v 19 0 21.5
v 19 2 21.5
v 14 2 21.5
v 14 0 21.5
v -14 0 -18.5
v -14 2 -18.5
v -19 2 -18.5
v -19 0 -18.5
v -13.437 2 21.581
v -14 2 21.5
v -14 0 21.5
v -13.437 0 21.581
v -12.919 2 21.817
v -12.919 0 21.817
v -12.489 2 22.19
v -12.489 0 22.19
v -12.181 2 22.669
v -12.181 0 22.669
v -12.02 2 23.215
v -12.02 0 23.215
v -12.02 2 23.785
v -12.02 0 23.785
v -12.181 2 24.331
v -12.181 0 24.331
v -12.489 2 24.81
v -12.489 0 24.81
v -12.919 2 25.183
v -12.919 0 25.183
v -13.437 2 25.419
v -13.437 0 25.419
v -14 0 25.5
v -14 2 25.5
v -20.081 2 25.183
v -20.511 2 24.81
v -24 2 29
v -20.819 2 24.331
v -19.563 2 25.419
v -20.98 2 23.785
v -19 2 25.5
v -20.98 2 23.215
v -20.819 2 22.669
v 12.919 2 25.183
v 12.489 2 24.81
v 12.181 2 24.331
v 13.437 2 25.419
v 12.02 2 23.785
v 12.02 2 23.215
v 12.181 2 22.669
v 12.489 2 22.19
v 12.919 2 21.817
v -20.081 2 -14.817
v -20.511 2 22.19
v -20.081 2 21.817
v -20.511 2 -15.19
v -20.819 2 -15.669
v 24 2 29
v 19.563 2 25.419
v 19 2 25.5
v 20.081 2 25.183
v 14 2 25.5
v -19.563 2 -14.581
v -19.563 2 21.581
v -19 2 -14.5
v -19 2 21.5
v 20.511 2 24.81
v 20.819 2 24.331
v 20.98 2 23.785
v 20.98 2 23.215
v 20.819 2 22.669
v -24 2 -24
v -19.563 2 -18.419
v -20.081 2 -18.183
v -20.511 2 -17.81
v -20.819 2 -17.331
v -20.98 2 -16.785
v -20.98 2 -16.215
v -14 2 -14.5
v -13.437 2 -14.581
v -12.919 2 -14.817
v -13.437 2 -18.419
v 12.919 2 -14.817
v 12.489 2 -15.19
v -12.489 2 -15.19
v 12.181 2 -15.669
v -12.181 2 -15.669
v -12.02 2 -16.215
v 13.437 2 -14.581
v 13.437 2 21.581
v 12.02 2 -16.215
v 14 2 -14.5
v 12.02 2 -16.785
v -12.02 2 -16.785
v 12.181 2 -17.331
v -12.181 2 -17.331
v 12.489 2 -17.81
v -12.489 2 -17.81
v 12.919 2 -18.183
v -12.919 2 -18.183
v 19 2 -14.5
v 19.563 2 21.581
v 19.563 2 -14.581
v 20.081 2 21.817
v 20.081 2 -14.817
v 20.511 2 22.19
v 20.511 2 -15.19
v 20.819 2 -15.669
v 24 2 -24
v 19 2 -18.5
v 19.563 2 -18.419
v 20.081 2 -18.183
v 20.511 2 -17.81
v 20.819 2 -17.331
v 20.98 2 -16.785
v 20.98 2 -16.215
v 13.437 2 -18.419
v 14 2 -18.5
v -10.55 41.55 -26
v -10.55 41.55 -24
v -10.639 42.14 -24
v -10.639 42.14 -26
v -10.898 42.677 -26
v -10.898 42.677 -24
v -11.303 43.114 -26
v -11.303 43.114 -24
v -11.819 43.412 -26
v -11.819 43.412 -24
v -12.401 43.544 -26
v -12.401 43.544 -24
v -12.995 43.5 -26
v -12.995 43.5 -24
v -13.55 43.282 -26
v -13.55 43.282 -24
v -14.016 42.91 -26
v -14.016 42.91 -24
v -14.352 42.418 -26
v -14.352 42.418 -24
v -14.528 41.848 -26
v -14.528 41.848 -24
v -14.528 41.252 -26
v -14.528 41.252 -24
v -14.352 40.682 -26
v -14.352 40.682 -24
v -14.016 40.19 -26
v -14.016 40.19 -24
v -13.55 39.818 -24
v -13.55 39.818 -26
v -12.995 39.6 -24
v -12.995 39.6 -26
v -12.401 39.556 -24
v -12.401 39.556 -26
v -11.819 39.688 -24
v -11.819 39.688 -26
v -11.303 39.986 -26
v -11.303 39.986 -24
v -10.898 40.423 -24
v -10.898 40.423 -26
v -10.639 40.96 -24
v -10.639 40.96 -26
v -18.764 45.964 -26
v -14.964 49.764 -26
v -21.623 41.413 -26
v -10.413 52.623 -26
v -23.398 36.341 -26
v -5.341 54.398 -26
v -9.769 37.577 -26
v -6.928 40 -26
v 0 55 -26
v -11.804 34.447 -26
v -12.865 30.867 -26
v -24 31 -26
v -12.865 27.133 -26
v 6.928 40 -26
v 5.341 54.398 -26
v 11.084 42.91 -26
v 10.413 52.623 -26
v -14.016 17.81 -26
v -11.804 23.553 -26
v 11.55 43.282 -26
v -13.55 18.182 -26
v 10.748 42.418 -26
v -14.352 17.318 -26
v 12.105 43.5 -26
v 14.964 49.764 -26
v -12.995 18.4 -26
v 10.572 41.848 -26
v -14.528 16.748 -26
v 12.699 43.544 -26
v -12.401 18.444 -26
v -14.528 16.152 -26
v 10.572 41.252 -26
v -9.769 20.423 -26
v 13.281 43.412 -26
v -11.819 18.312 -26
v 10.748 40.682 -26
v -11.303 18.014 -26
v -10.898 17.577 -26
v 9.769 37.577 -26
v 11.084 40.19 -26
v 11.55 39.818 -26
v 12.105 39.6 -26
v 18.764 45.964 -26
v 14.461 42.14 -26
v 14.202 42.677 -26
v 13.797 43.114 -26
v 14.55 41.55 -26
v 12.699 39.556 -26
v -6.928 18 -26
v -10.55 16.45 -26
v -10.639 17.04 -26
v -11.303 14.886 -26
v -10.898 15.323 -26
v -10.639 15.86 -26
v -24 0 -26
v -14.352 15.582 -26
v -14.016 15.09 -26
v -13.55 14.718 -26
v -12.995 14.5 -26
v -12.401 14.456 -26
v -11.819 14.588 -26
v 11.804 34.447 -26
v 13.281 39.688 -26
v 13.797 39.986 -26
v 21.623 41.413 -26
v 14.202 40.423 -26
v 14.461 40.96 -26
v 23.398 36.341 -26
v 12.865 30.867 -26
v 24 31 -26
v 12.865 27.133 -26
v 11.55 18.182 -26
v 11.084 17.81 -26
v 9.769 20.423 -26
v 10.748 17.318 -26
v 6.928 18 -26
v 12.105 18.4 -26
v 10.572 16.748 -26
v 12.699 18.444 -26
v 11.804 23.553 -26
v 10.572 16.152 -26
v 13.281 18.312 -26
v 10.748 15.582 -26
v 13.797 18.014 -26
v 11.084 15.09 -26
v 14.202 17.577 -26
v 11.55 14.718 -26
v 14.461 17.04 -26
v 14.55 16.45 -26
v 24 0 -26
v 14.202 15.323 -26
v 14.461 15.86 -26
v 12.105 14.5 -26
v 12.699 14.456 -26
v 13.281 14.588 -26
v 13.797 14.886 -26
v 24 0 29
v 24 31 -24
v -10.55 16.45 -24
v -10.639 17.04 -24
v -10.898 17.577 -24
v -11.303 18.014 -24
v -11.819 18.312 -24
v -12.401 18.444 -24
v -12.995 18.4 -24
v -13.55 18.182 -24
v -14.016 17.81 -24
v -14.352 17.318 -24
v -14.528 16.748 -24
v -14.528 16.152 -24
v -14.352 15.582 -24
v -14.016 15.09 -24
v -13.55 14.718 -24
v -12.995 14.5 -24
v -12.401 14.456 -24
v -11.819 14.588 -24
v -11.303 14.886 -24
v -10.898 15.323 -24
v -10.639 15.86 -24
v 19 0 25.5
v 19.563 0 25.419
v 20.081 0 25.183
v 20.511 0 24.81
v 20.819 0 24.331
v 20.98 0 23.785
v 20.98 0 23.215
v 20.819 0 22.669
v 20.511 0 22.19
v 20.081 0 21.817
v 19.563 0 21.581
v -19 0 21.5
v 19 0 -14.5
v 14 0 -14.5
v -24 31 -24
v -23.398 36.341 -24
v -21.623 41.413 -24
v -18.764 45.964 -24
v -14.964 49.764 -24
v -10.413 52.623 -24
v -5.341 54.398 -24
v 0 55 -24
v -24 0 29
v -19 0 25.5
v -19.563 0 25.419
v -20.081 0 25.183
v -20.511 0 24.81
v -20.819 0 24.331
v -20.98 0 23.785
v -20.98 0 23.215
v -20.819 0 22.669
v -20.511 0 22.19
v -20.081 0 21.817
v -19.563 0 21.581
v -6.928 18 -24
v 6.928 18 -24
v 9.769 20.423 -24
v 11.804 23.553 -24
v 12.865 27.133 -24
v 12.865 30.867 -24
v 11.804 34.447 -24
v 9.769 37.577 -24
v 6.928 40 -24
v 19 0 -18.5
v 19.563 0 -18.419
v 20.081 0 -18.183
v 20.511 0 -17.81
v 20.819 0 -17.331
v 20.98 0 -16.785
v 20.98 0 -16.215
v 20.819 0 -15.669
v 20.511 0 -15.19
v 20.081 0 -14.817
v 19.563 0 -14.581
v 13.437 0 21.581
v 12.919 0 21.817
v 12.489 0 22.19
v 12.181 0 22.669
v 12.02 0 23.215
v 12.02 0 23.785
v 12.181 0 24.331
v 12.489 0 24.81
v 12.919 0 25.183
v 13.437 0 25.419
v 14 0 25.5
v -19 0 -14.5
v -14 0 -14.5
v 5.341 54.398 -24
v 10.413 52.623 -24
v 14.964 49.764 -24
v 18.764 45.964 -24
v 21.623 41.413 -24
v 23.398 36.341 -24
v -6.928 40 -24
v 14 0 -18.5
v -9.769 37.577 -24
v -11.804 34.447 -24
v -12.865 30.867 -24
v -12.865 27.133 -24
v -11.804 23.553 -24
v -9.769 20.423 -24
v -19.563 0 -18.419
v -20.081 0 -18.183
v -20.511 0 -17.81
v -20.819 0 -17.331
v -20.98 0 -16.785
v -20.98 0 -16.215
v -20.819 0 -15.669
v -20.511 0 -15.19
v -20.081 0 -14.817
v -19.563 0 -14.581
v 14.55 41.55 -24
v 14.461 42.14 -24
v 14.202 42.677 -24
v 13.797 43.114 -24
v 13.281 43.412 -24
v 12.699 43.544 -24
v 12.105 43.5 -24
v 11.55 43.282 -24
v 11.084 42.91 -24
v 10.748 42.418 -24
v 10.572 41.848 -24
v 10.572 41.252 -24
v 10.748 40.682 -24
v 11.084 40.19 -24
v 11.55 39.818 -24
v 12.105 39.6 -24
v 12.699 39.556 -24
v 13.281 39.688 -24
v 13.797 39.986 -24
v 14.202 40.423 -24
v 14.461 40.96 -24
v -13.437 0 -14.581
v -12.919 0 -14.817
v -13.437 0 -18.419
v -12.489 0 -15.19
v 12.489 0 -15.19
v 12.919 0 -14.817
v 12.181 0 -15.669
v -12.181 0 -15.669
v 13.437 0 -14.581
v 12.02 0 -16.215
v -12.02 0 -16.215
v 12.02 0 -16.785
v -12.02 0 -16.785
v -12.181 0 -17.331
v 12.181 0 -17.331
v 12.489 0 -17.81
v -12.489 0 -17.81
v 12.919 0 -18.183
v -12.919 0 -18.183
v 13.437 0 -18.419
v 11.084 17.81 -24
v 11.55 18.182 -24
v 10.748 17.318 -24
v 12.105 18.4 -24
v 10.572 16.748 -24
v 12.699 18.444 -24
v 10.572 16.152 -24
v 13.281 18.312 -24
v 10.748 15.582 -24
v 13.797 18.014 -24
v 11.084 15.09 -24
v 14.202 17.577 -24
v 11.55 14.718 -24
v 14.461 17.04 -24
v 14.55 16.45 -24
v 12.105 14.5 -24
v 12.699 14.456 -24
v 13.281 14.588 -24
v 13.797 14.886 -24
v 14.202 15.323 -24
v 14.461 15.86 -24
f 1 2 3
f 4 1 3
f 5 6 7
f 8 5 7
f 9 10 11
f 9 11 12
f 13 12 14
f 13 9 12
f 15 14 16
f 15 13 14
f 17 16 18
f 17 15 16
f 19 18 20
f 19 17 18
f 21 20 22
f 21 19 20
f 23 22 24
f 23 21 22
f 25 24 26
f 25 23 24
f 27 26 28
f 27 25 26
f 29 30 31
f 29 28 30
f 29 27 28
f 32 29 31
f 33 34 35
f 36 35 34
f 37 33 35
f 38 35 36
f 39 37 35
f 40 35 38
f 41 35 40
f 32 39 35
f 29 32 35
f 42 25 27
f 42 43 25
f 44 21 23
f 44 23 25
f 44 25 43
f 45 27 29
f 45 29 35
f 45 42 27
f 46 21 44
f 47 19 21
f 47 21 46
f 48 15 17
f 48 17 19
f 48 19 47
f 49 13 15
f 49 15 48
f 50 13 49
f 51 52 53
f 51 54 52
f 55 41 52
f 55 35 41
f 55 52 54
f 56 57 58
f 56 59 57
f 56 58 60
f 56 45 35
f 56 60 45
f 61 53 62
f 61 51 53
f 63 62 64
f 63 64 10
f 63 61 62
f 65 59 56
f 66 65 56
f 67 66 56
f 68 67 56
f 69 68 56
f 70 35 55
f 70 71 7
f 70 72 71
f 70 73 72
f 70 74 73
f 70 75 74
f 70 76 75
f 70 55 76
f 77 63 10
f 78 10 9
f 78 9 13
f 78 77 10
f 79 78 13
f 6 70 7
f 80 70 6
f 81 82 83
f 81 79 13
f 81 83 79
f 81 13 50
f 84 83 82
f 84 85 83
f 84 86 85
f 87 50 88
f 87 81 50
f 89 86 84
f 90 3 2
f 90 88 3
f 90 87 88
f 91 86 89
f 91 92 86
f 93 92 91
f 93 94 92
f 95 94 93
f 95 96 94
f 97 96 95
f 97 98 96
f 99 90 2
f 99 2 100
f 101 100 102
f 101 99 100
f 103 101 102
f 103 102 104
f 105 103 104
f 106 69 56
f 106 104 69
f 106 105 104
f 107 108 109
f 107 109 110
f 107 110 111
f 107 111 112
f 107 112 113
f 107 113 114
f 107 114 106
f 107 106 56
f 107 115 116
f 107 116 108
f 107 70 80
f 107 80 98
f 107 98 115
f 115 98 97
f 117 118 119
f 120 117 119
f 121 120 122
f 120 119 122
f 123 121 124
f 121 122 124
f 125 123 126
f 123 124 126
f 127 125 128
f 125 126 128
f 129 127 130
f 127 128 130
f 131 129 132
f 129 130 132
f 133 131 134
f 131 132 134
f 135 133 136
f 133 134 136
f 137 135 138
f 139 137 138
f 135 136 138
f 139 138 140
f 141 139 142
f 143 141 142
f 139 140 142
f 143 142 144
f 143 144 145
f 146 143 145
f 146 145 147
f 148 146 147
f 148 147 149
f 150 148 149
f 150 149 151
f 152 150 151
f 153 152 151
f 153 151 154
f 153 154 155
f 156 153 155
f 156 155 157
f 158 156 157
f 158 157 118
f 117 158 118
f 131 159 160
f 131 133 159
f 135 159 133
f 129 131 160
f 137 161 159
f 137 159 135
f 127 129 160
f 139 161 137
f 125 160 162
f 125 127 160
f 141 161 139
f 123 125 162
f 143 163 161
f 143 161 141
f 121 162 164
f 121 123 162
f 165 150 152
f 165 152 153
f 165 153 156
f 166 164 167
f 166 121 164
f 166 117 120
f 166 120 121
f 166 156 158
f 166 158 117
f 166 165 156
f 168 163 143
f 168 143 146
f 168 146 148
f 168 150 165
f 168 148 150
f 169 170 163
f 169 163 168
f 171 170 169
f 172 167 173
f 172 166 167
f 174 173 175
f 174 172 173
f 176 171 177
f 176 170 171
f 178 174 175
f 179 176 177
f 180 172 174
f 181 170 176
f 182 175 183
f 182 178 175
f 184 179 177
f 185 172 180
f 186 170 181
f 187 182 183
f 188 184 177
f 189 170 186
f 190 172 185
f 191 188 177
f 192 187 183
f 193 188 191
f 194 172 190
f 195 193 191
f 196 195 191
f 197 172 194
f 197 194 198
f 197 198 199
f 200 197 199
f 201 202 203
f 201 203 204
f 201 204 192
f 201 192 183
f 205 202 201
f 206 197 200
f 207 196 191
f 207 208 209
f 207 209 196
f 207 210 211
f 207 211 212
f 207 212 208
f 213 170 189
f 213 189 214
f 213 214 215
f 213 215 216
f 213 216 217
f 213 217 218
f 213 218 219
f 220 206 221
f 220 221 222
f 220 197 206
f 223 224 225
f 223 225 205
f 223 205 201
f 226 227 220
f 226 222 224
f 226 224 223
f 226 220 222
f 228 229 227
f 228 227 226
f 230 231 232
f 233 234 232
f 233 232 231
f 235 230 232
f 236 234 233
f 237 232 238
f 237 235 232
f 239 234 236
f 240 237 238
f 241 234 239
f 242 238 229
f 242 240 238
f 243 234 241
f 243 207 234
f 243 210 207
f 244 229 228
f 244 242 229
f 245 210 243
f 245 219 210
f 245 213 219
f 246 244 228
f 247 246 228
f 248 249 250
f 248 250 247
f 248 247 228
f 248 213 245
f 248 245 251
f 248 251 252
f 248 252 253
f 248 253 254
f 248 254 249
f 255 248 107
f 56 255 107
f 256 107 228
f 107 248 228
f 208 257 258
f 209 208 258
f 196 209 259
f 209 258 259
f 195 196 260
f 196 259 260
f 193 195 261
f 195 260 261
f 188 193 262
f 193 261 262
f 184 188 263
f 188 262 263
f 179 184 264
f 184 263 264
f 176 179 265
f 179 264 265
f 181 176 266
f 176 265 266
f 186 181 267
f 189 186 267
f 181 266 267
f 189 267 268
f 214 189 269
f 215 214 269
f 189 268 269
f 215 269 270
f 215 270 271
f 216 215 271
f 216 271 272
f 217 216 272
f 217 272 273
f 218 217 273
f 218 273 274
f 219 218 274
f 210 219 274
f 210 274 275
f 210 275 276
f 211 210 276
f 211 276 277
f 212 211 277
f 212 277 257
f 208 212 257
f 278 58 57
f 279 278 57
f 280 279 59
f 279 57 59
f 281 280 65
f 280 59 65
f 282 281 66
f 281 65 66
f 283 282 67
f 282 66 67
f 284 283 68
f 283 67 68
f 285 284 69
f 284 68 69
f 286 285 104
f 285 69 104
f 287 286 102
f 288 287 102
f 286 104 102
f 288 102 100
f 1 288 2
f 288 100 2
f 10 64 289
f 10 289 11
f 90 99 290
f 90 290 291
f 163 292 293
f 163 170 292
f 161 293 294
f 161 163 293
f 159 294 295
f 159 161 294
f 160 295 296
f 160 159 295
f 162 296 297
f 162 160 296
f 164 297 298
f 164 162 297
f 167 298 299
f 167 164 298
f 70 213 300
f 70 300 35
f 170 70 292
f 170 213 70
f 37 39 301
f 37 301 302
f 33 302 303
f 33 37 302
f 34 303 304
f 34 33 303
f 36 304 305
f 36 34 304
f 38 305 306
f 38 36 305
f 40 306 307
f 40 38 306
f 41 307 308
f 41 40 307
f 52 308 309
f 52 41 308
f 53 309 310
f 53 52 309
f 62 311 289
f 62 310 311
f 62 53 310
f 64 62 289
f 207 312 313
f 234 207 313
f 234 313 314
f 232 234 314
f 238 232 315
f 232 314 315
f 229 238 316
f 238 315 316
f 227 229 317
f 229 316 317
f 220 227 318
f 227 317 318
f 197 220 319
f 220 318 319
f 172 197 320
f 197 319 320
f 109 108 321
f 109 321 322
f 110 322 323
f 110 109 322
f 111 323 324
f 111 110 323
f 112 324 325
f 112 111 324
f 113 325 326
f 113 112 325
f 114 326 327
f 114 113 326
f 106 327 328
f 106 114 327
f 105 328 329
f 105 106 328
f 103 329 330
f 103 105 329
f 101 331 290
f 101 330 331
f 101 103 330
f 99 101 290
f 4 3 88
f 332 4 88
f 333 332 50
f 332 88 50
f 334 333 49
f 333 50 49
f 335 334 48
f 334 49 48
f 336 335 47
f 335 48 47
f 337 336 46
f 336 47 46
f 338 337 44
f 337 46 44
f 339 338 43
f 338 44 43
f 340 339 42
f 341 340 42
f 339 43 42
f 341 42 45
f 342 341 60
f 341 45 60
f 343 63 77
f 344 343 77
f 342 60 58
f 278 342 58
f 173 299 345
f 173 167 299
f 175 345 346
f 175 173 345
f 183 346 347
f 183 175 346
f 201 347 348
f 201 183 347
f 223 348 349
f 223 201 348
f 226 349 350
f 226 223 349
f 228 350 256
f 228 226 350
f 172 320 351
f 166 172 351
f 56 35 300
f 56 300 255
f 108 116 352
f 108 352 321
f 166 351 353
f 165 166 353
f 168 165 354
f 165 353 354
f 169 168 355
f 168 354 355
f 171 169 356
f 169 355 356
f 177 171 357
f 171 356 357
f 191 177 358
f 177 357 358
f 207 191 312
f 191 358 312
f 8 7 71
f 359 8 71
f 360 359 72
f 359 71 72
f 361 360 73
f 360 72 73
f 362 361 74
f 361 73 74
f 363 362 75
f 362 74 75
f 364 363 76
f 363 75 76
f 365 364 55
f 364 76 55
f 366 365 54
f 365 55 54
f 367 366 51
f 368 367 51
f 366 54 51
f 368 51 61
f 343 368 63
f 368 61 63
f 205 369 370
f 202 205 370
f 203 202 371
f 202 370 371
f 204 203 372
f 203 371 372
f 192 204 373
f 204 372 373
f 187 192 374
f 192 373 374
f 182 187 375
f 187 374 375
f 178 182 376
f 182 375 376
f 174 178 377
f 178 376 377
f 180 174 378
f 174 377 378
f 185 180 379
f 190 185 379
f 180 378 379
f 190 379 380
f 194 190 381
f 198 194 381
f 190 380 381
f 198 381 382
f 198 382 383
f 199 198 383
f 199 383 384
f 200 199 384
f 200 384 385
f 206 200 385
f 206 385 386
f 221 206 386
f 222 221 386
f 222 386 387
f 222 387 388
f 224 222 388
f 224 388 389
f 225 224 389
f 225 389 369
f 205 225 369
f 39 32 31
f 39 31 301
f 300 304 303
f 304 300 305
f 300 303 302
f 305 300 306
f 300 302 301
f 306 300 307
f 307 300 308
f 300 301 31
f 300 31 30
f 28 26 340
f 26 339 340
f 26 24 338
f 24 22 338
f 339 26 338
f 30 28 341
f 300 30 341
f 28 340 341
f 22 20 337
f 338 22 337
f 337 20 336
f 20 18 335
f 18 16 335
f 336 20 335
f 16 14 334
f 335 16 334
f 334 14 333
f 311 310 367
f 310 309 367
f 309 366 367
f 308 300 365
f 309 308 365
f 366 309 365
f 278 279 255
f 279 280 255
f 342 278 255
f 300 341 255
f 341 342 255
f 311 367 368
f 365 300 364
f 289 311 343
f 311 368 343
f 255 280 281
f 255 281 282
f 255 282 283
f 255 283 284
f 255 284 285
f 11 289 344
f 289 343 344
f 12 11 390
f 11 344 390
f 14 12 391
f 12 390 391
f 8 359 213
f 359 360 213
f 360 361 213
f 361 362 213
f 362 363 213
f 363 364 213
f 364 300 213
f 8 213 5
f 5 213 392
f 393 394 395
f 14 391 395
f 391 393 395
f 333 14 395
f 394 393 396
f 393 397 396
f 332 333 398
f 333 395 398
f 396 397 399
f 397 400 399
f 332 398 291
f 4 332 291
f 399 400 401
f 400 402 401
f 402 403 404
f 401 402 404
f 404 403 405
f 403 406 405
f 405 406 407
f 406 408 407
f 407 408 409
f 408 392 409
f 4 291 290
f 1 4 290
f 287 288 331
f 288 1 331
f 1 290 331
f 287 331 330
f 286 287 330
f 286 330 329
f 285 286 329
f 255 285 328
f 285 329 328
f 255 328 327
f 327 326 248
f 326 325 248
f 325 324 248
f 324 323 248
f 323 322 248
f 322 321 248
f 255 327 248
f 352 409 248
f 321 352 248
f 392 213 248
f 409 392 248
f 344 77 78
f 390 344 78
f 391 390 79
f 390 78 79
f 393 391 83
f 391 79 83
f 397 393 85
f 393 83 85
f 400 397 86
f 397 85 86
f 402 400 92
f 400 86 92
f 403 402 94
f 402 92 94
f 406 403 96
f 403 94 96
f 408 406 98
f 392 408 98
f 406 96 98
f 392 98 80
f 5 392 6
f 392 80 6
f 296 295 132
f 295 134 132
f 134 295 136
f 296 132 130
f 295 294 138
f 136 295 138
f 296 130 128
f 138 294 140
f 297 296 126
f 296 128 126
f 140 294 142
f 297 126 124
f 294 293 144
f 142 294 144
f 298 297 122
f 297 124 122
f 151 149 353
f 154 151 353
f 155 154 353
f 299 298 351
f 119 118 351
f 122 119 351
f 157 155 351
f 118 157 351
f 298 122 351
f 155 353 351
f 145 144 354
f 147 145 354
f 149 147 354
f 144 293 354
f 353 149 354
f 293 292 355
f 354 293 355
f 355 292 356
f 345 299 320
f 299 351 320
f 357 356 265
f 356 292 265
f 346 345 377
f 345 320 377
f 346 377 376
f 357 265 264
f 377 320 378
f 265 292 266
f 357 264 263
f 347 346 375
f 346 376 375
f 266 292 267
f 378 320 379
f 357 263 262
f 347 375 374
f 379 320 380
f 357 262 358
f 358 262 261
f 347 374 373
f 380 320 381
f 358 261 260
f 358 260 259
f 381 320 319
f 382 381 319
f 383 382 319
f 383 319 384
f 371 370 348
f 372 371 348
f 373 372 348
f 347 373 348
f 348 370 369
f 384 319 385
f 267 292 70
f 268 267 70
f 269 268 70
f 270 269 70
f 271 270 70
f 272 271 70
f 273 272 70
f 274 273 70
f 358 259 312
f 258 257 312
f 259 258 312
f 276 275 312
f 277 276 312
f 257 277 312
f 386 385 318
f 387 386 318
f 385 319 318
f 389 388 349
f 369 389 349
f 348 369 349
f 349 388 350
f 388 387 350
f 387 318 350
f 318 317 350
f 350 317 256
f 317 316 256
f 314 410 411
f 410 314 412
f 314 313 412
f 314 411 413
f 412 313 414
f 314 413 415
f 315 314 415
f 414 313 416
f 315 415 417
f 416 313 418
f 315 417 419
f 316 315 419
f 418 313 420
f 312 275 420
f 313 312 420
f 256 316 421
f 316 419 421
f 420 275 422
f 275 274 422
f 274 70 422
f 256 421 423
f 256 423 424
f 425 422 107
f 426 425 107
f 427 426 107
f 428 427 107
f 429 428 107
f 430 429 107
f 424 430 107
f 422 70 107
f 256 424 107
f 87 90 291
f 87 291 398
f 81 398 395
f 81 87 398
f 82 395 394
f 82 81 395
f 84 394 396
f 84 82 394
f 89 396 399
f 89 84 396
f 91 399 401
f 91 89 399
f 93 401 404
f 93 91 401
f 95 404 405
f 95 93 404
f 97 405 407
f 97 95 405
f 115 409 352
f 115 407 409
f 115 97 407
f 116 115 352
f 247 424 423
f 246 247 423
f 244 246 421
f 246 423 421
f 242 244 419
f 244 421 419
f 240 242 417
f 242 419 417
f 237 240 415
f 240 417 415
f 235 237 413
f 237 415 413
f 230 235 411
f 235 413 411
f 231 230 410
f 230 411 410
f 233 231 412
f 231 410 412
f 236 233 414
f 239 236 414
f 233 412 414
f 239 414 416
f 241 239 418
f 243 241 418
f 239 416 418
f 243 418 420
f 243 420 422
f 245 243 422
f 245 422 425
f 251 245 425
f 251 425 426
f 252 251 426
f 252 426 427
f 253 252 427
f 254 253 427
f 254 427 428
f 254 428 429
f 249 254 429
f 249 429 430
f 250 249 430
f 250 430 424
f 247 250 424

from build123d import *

# Parameters (mm, degrees)
SKETCH2_W           = 50
SKETCH2_H           = 52
BOSS_EXTRUDE1_DEPTH = 52
SKETCH3_W           = 50
SKETCH3_H           = 50
CUT_EXTRUDE1_DEPTH  = 50
CUT_EXTRUDE3_DEPTH  = 50
SKETCH5_R           = 2
CUT_EXTRUDE4_DEPTH  = 50
SKETCH7_W           = 52
SKETCH7_H           = 2
BOSS_EXTRUDE2_DEPTH = 5
SKETCH8_R           = 2.5
CUT_EXTRUDE6_DEPTH  = 5
SKETCH10_W          = 1
SKETCH10_H          = 2
CUT_EXTRUDE7_DEPTH  = 160
SKETCH11_W          = 48
SKETCH11_H          = 2
BOSS_EXTRUDE3_DEPTH = 3
SKETCH12_W          = 48
SKETCH12_H          = 2
BOSS_EXTRUDE4_DEPTH = 53
CUT_EXTRUDE9_DEPTH  = 53
FILLET1_R           = 24
FILLET2_R           = 24


with BuildPart() as part:
    # Sketch2 → Boss-Extrude1 (new body)
    with BuildSketch(Plane(origin=(0, 0, 0), x_dir=(1, 0, 0), z_dir=(0, 1, 0))):
        Rectangle(SKETCH2_W, SKETCH2_H)
    extrude(amount=BOSS_EXTRUDE1_DEPTH)

    # Sketch3 → Cut-Extrude1 (cut)
    with BuildSketch(Plane(origin=(0, 52, 0), x_dir=(1, 0, 0), z_dir=(0, 1, 0))):
        with Locations((0, -1)):
            Rectangle(SKETCH3_W, SKETCH3_H)
    extrude(amount=-CUT_EXTRUDE1_DEPTH, mode=Mode.SUBTRACT)

    # Sketch4 → Cut-Extrude3 (cut)
    with BuildSketch(Plane.XY.offset(-24)):
        with BuildLine():
            Line((-6.92820323, 18), (0, 18))
            Line((0, 18), (0, 24))
            ThreePointArc((0, 24), (-5, 29), (0, 34))
            Line((0, 34), (0, 40))
            Line((0, 40), (-6.92820323, 40))
            ThreePointArc((-6.92820323, 40), (-13, 29), (-6.92820323, 18))
        make_face()
        with BuildLine():
            Line((0, 24), (0, 18))
            Line((0, 18), (6.92820323, 18))
            ThreePointArc((6.92820323, 18), (13, 29), (6.92820323, 40))
            Line((6.92820323, 40), (0, 40))
            Line((0, 40), (0, 34))
            ThreePointArc((0, 34), (3.535533906, 32.535533906), (5, 29))
            ThreePointArc((5, 29), (3.535533906, 25.464466094), (0, 24))
        make_face()
    extrude(amount=-CUT_EXTRUDE3_DEPTH, mode=Mode.SUBTRACT)


with BuildPart() as body_2:
    # of the pieces the cut leaves, the one that is kept (cut_extrude3_keep)
    add(part.part.solids().sort_by_distance((25, 0, 26))[0])

    # Sketch5 → Cut-Extrude4 (cut)
    with BuildSketch(Plane.XY.offset(-24)):
        with Locations((12.55, 41.55)):
            Circle(SKETCH5_R)
        with Locations((-12.55, 41.55)):
            Circle(SKETCH5_R)
        with Locations((12.55, 16.45)):
            Circle(SKETCH5_R)
        with Locations((-12.55, 16.45)):
            Circle(SKETCH5_R)
    extrude(amount=-CUT_EXTRUDE4_DEPTH, mode=Mode.SUBTRACT)

    # Sketch7 → Boss-Extrude2 (add)
    with BuildSketch(Plane(origin=(25, 0, 0), x_dir=(0, 0, -1), z_dir=(1, 0, 0))):
        with Locations((0, 1)):
            Rectangle(SKETCH7_W, SKETCH7_H)
    boss_extrude2 = extrude(amount=BOSS_EXTRUDE2_DEPTH)

    # Mirror1: Boss-Extrude2 across plane
    add(boss_extrude2.mirror(Plane(origin=(0, 0, 0), x_dir=(0, 0, 1), z_dir=(1, 0, 0))))

    # Sketch8 → Cut-Extrude6 (cut)
    with BuildSketch(Plane(origin=(0, 2, 0), x_dir=(1, 0, 0), z_dir=(0, 1, 0))):
        with Locations(Location((-26.5, 14, 0), (0, 0, 270))):
            Circle(SKETCH8_R)
        with Locations(Location((-26.5, -16, 0), (0, 0, 270))):
            Circle(SKETCH8_R)
        with Locations(Location((26.5, 14, 0), (0, 0, 270))):
            Circle(SKETCH8_R)
        with Locations(Location((26.5, -16, 0), (0, 0, 270))):
            Circle(SKETCH8_R)
    extrude(amount=-CUT_EXTRUDE6_DEPTH, mode=Mode.SUBTRACT)

    # Sketch10 → Cut-Extrude7 (cut)
    with BuildSketch(Plane(origin=(0, 52, 0), x_dir=(1, 0, 0), z_dir=(0, 1, 0))):
        Polygon((25, 24), (24, 24), (-24, 24), (-25, 24), (-25, 26), (-30, 26), (-30, -26), (30, -26), (30, 26), (25, 26), align=None)
        with Locations((-24.5, 25)):
            Rectangle(SKETCH10_W, SKETCH10_H)
        with Locations((24.5, 25)):
            Rectangle(SKETCH10_W, SKETCH10_H)
    extrude(amount=-CUT_EXTRUDE7_DEPTH, mode=Mode.SUBTRACT)

    # Sketch11 → Boss-Extrude3 (add)
    with BuildSketch(Plane(origin=(0, 52, 0), x_dir=(1, 0, 0), z_dir=(0, 1, 0))):
        with Locations((0, 25)):
            Rectangle(SKETCH11_W, SKETCH11_H)
    extrude(amount=BOSS_EXTRUDE3_DEPTH)

    # Sketch12 → Boss-Extrude4 (add)
    with BuildSketch(Plane.XY.offset(-24)):
        with Locations((0, 1)):
            Rectangle(SKETCH12_W, SKETCH12_H)
    extrude(amount=BOSS_EXTRUDE4_DEPTH)

    # Sketch13 → Cut-Extrude9 (cut)
    with BuildSketch(Plane(origin=(0, 2, 0), x_dir=(1, 0, 0), z_dir=(0, 1, 0))):
        with BuildLine():
            Line((19, 14.5), (14, 14.5))
            ThreePointArc((14, 14.5), (12, 16.5), (14, 18.5))
            Line((14, 18.5), (19, 18.5))
            ThreePointArc((19, 18.5), (21, 16.5), (19, 14.5))
        make_face()
        with BuildLine():
            Line((-19, 14.5), (-14, 14.5))
            ThreePointArc((-14, 14.5), (-12, 16.5), (-14, 18.5))
            Line((-14, 18.5), (-19, 18.5))
            ThreePointArc((-19, 18.5), (-21, 16.5), (-19, 14.5))
        make_face()
        with BuildLine():
            Line((-19, -21.5), (-14, -21.5))
            ThreePointArc((-14, -21.5), (-12, -23.5), (-14, -25.5))
            Line((-14, -25.5), (-19, -25.5))
            ThreePointArc((-19, -25.5), (-21, -23.5), (-19, -21.5))
        make_face()
        with BuildLine():
            Line((19, -21.5), (14, -21.5))
            ThreePointArc((14, -21.5), (12, -23.5), (14, -25.5))
            Line((14, -25.5), (19, -25.5))
            ThreePointArc((19, -25.5), (21, -23.5), (19, -21.5))
        make_face()
    extrude(amount=-CUT_EXTRUDE9_DEPTH, mode=Mode.SUBTRACT)

    # Fillet1
    fillet1_edges = [body_2.edges().sort_by_distance(p)[0] for p in [
        (-24, 55, -25),
    ]]
    fillet(fillet1_edges, radius=FILLET1_R)

    # Fillet2
    fillet2_edges = [body_2.edges().sort_by_distance(p)[0] for p in [
        (24, 55, -25),
    ]]
    fillet(fillet2_edges, radius=FILLET2_R - 0.0001)  # a hair under: the kernel refuses the full size


solid = body_2.part
